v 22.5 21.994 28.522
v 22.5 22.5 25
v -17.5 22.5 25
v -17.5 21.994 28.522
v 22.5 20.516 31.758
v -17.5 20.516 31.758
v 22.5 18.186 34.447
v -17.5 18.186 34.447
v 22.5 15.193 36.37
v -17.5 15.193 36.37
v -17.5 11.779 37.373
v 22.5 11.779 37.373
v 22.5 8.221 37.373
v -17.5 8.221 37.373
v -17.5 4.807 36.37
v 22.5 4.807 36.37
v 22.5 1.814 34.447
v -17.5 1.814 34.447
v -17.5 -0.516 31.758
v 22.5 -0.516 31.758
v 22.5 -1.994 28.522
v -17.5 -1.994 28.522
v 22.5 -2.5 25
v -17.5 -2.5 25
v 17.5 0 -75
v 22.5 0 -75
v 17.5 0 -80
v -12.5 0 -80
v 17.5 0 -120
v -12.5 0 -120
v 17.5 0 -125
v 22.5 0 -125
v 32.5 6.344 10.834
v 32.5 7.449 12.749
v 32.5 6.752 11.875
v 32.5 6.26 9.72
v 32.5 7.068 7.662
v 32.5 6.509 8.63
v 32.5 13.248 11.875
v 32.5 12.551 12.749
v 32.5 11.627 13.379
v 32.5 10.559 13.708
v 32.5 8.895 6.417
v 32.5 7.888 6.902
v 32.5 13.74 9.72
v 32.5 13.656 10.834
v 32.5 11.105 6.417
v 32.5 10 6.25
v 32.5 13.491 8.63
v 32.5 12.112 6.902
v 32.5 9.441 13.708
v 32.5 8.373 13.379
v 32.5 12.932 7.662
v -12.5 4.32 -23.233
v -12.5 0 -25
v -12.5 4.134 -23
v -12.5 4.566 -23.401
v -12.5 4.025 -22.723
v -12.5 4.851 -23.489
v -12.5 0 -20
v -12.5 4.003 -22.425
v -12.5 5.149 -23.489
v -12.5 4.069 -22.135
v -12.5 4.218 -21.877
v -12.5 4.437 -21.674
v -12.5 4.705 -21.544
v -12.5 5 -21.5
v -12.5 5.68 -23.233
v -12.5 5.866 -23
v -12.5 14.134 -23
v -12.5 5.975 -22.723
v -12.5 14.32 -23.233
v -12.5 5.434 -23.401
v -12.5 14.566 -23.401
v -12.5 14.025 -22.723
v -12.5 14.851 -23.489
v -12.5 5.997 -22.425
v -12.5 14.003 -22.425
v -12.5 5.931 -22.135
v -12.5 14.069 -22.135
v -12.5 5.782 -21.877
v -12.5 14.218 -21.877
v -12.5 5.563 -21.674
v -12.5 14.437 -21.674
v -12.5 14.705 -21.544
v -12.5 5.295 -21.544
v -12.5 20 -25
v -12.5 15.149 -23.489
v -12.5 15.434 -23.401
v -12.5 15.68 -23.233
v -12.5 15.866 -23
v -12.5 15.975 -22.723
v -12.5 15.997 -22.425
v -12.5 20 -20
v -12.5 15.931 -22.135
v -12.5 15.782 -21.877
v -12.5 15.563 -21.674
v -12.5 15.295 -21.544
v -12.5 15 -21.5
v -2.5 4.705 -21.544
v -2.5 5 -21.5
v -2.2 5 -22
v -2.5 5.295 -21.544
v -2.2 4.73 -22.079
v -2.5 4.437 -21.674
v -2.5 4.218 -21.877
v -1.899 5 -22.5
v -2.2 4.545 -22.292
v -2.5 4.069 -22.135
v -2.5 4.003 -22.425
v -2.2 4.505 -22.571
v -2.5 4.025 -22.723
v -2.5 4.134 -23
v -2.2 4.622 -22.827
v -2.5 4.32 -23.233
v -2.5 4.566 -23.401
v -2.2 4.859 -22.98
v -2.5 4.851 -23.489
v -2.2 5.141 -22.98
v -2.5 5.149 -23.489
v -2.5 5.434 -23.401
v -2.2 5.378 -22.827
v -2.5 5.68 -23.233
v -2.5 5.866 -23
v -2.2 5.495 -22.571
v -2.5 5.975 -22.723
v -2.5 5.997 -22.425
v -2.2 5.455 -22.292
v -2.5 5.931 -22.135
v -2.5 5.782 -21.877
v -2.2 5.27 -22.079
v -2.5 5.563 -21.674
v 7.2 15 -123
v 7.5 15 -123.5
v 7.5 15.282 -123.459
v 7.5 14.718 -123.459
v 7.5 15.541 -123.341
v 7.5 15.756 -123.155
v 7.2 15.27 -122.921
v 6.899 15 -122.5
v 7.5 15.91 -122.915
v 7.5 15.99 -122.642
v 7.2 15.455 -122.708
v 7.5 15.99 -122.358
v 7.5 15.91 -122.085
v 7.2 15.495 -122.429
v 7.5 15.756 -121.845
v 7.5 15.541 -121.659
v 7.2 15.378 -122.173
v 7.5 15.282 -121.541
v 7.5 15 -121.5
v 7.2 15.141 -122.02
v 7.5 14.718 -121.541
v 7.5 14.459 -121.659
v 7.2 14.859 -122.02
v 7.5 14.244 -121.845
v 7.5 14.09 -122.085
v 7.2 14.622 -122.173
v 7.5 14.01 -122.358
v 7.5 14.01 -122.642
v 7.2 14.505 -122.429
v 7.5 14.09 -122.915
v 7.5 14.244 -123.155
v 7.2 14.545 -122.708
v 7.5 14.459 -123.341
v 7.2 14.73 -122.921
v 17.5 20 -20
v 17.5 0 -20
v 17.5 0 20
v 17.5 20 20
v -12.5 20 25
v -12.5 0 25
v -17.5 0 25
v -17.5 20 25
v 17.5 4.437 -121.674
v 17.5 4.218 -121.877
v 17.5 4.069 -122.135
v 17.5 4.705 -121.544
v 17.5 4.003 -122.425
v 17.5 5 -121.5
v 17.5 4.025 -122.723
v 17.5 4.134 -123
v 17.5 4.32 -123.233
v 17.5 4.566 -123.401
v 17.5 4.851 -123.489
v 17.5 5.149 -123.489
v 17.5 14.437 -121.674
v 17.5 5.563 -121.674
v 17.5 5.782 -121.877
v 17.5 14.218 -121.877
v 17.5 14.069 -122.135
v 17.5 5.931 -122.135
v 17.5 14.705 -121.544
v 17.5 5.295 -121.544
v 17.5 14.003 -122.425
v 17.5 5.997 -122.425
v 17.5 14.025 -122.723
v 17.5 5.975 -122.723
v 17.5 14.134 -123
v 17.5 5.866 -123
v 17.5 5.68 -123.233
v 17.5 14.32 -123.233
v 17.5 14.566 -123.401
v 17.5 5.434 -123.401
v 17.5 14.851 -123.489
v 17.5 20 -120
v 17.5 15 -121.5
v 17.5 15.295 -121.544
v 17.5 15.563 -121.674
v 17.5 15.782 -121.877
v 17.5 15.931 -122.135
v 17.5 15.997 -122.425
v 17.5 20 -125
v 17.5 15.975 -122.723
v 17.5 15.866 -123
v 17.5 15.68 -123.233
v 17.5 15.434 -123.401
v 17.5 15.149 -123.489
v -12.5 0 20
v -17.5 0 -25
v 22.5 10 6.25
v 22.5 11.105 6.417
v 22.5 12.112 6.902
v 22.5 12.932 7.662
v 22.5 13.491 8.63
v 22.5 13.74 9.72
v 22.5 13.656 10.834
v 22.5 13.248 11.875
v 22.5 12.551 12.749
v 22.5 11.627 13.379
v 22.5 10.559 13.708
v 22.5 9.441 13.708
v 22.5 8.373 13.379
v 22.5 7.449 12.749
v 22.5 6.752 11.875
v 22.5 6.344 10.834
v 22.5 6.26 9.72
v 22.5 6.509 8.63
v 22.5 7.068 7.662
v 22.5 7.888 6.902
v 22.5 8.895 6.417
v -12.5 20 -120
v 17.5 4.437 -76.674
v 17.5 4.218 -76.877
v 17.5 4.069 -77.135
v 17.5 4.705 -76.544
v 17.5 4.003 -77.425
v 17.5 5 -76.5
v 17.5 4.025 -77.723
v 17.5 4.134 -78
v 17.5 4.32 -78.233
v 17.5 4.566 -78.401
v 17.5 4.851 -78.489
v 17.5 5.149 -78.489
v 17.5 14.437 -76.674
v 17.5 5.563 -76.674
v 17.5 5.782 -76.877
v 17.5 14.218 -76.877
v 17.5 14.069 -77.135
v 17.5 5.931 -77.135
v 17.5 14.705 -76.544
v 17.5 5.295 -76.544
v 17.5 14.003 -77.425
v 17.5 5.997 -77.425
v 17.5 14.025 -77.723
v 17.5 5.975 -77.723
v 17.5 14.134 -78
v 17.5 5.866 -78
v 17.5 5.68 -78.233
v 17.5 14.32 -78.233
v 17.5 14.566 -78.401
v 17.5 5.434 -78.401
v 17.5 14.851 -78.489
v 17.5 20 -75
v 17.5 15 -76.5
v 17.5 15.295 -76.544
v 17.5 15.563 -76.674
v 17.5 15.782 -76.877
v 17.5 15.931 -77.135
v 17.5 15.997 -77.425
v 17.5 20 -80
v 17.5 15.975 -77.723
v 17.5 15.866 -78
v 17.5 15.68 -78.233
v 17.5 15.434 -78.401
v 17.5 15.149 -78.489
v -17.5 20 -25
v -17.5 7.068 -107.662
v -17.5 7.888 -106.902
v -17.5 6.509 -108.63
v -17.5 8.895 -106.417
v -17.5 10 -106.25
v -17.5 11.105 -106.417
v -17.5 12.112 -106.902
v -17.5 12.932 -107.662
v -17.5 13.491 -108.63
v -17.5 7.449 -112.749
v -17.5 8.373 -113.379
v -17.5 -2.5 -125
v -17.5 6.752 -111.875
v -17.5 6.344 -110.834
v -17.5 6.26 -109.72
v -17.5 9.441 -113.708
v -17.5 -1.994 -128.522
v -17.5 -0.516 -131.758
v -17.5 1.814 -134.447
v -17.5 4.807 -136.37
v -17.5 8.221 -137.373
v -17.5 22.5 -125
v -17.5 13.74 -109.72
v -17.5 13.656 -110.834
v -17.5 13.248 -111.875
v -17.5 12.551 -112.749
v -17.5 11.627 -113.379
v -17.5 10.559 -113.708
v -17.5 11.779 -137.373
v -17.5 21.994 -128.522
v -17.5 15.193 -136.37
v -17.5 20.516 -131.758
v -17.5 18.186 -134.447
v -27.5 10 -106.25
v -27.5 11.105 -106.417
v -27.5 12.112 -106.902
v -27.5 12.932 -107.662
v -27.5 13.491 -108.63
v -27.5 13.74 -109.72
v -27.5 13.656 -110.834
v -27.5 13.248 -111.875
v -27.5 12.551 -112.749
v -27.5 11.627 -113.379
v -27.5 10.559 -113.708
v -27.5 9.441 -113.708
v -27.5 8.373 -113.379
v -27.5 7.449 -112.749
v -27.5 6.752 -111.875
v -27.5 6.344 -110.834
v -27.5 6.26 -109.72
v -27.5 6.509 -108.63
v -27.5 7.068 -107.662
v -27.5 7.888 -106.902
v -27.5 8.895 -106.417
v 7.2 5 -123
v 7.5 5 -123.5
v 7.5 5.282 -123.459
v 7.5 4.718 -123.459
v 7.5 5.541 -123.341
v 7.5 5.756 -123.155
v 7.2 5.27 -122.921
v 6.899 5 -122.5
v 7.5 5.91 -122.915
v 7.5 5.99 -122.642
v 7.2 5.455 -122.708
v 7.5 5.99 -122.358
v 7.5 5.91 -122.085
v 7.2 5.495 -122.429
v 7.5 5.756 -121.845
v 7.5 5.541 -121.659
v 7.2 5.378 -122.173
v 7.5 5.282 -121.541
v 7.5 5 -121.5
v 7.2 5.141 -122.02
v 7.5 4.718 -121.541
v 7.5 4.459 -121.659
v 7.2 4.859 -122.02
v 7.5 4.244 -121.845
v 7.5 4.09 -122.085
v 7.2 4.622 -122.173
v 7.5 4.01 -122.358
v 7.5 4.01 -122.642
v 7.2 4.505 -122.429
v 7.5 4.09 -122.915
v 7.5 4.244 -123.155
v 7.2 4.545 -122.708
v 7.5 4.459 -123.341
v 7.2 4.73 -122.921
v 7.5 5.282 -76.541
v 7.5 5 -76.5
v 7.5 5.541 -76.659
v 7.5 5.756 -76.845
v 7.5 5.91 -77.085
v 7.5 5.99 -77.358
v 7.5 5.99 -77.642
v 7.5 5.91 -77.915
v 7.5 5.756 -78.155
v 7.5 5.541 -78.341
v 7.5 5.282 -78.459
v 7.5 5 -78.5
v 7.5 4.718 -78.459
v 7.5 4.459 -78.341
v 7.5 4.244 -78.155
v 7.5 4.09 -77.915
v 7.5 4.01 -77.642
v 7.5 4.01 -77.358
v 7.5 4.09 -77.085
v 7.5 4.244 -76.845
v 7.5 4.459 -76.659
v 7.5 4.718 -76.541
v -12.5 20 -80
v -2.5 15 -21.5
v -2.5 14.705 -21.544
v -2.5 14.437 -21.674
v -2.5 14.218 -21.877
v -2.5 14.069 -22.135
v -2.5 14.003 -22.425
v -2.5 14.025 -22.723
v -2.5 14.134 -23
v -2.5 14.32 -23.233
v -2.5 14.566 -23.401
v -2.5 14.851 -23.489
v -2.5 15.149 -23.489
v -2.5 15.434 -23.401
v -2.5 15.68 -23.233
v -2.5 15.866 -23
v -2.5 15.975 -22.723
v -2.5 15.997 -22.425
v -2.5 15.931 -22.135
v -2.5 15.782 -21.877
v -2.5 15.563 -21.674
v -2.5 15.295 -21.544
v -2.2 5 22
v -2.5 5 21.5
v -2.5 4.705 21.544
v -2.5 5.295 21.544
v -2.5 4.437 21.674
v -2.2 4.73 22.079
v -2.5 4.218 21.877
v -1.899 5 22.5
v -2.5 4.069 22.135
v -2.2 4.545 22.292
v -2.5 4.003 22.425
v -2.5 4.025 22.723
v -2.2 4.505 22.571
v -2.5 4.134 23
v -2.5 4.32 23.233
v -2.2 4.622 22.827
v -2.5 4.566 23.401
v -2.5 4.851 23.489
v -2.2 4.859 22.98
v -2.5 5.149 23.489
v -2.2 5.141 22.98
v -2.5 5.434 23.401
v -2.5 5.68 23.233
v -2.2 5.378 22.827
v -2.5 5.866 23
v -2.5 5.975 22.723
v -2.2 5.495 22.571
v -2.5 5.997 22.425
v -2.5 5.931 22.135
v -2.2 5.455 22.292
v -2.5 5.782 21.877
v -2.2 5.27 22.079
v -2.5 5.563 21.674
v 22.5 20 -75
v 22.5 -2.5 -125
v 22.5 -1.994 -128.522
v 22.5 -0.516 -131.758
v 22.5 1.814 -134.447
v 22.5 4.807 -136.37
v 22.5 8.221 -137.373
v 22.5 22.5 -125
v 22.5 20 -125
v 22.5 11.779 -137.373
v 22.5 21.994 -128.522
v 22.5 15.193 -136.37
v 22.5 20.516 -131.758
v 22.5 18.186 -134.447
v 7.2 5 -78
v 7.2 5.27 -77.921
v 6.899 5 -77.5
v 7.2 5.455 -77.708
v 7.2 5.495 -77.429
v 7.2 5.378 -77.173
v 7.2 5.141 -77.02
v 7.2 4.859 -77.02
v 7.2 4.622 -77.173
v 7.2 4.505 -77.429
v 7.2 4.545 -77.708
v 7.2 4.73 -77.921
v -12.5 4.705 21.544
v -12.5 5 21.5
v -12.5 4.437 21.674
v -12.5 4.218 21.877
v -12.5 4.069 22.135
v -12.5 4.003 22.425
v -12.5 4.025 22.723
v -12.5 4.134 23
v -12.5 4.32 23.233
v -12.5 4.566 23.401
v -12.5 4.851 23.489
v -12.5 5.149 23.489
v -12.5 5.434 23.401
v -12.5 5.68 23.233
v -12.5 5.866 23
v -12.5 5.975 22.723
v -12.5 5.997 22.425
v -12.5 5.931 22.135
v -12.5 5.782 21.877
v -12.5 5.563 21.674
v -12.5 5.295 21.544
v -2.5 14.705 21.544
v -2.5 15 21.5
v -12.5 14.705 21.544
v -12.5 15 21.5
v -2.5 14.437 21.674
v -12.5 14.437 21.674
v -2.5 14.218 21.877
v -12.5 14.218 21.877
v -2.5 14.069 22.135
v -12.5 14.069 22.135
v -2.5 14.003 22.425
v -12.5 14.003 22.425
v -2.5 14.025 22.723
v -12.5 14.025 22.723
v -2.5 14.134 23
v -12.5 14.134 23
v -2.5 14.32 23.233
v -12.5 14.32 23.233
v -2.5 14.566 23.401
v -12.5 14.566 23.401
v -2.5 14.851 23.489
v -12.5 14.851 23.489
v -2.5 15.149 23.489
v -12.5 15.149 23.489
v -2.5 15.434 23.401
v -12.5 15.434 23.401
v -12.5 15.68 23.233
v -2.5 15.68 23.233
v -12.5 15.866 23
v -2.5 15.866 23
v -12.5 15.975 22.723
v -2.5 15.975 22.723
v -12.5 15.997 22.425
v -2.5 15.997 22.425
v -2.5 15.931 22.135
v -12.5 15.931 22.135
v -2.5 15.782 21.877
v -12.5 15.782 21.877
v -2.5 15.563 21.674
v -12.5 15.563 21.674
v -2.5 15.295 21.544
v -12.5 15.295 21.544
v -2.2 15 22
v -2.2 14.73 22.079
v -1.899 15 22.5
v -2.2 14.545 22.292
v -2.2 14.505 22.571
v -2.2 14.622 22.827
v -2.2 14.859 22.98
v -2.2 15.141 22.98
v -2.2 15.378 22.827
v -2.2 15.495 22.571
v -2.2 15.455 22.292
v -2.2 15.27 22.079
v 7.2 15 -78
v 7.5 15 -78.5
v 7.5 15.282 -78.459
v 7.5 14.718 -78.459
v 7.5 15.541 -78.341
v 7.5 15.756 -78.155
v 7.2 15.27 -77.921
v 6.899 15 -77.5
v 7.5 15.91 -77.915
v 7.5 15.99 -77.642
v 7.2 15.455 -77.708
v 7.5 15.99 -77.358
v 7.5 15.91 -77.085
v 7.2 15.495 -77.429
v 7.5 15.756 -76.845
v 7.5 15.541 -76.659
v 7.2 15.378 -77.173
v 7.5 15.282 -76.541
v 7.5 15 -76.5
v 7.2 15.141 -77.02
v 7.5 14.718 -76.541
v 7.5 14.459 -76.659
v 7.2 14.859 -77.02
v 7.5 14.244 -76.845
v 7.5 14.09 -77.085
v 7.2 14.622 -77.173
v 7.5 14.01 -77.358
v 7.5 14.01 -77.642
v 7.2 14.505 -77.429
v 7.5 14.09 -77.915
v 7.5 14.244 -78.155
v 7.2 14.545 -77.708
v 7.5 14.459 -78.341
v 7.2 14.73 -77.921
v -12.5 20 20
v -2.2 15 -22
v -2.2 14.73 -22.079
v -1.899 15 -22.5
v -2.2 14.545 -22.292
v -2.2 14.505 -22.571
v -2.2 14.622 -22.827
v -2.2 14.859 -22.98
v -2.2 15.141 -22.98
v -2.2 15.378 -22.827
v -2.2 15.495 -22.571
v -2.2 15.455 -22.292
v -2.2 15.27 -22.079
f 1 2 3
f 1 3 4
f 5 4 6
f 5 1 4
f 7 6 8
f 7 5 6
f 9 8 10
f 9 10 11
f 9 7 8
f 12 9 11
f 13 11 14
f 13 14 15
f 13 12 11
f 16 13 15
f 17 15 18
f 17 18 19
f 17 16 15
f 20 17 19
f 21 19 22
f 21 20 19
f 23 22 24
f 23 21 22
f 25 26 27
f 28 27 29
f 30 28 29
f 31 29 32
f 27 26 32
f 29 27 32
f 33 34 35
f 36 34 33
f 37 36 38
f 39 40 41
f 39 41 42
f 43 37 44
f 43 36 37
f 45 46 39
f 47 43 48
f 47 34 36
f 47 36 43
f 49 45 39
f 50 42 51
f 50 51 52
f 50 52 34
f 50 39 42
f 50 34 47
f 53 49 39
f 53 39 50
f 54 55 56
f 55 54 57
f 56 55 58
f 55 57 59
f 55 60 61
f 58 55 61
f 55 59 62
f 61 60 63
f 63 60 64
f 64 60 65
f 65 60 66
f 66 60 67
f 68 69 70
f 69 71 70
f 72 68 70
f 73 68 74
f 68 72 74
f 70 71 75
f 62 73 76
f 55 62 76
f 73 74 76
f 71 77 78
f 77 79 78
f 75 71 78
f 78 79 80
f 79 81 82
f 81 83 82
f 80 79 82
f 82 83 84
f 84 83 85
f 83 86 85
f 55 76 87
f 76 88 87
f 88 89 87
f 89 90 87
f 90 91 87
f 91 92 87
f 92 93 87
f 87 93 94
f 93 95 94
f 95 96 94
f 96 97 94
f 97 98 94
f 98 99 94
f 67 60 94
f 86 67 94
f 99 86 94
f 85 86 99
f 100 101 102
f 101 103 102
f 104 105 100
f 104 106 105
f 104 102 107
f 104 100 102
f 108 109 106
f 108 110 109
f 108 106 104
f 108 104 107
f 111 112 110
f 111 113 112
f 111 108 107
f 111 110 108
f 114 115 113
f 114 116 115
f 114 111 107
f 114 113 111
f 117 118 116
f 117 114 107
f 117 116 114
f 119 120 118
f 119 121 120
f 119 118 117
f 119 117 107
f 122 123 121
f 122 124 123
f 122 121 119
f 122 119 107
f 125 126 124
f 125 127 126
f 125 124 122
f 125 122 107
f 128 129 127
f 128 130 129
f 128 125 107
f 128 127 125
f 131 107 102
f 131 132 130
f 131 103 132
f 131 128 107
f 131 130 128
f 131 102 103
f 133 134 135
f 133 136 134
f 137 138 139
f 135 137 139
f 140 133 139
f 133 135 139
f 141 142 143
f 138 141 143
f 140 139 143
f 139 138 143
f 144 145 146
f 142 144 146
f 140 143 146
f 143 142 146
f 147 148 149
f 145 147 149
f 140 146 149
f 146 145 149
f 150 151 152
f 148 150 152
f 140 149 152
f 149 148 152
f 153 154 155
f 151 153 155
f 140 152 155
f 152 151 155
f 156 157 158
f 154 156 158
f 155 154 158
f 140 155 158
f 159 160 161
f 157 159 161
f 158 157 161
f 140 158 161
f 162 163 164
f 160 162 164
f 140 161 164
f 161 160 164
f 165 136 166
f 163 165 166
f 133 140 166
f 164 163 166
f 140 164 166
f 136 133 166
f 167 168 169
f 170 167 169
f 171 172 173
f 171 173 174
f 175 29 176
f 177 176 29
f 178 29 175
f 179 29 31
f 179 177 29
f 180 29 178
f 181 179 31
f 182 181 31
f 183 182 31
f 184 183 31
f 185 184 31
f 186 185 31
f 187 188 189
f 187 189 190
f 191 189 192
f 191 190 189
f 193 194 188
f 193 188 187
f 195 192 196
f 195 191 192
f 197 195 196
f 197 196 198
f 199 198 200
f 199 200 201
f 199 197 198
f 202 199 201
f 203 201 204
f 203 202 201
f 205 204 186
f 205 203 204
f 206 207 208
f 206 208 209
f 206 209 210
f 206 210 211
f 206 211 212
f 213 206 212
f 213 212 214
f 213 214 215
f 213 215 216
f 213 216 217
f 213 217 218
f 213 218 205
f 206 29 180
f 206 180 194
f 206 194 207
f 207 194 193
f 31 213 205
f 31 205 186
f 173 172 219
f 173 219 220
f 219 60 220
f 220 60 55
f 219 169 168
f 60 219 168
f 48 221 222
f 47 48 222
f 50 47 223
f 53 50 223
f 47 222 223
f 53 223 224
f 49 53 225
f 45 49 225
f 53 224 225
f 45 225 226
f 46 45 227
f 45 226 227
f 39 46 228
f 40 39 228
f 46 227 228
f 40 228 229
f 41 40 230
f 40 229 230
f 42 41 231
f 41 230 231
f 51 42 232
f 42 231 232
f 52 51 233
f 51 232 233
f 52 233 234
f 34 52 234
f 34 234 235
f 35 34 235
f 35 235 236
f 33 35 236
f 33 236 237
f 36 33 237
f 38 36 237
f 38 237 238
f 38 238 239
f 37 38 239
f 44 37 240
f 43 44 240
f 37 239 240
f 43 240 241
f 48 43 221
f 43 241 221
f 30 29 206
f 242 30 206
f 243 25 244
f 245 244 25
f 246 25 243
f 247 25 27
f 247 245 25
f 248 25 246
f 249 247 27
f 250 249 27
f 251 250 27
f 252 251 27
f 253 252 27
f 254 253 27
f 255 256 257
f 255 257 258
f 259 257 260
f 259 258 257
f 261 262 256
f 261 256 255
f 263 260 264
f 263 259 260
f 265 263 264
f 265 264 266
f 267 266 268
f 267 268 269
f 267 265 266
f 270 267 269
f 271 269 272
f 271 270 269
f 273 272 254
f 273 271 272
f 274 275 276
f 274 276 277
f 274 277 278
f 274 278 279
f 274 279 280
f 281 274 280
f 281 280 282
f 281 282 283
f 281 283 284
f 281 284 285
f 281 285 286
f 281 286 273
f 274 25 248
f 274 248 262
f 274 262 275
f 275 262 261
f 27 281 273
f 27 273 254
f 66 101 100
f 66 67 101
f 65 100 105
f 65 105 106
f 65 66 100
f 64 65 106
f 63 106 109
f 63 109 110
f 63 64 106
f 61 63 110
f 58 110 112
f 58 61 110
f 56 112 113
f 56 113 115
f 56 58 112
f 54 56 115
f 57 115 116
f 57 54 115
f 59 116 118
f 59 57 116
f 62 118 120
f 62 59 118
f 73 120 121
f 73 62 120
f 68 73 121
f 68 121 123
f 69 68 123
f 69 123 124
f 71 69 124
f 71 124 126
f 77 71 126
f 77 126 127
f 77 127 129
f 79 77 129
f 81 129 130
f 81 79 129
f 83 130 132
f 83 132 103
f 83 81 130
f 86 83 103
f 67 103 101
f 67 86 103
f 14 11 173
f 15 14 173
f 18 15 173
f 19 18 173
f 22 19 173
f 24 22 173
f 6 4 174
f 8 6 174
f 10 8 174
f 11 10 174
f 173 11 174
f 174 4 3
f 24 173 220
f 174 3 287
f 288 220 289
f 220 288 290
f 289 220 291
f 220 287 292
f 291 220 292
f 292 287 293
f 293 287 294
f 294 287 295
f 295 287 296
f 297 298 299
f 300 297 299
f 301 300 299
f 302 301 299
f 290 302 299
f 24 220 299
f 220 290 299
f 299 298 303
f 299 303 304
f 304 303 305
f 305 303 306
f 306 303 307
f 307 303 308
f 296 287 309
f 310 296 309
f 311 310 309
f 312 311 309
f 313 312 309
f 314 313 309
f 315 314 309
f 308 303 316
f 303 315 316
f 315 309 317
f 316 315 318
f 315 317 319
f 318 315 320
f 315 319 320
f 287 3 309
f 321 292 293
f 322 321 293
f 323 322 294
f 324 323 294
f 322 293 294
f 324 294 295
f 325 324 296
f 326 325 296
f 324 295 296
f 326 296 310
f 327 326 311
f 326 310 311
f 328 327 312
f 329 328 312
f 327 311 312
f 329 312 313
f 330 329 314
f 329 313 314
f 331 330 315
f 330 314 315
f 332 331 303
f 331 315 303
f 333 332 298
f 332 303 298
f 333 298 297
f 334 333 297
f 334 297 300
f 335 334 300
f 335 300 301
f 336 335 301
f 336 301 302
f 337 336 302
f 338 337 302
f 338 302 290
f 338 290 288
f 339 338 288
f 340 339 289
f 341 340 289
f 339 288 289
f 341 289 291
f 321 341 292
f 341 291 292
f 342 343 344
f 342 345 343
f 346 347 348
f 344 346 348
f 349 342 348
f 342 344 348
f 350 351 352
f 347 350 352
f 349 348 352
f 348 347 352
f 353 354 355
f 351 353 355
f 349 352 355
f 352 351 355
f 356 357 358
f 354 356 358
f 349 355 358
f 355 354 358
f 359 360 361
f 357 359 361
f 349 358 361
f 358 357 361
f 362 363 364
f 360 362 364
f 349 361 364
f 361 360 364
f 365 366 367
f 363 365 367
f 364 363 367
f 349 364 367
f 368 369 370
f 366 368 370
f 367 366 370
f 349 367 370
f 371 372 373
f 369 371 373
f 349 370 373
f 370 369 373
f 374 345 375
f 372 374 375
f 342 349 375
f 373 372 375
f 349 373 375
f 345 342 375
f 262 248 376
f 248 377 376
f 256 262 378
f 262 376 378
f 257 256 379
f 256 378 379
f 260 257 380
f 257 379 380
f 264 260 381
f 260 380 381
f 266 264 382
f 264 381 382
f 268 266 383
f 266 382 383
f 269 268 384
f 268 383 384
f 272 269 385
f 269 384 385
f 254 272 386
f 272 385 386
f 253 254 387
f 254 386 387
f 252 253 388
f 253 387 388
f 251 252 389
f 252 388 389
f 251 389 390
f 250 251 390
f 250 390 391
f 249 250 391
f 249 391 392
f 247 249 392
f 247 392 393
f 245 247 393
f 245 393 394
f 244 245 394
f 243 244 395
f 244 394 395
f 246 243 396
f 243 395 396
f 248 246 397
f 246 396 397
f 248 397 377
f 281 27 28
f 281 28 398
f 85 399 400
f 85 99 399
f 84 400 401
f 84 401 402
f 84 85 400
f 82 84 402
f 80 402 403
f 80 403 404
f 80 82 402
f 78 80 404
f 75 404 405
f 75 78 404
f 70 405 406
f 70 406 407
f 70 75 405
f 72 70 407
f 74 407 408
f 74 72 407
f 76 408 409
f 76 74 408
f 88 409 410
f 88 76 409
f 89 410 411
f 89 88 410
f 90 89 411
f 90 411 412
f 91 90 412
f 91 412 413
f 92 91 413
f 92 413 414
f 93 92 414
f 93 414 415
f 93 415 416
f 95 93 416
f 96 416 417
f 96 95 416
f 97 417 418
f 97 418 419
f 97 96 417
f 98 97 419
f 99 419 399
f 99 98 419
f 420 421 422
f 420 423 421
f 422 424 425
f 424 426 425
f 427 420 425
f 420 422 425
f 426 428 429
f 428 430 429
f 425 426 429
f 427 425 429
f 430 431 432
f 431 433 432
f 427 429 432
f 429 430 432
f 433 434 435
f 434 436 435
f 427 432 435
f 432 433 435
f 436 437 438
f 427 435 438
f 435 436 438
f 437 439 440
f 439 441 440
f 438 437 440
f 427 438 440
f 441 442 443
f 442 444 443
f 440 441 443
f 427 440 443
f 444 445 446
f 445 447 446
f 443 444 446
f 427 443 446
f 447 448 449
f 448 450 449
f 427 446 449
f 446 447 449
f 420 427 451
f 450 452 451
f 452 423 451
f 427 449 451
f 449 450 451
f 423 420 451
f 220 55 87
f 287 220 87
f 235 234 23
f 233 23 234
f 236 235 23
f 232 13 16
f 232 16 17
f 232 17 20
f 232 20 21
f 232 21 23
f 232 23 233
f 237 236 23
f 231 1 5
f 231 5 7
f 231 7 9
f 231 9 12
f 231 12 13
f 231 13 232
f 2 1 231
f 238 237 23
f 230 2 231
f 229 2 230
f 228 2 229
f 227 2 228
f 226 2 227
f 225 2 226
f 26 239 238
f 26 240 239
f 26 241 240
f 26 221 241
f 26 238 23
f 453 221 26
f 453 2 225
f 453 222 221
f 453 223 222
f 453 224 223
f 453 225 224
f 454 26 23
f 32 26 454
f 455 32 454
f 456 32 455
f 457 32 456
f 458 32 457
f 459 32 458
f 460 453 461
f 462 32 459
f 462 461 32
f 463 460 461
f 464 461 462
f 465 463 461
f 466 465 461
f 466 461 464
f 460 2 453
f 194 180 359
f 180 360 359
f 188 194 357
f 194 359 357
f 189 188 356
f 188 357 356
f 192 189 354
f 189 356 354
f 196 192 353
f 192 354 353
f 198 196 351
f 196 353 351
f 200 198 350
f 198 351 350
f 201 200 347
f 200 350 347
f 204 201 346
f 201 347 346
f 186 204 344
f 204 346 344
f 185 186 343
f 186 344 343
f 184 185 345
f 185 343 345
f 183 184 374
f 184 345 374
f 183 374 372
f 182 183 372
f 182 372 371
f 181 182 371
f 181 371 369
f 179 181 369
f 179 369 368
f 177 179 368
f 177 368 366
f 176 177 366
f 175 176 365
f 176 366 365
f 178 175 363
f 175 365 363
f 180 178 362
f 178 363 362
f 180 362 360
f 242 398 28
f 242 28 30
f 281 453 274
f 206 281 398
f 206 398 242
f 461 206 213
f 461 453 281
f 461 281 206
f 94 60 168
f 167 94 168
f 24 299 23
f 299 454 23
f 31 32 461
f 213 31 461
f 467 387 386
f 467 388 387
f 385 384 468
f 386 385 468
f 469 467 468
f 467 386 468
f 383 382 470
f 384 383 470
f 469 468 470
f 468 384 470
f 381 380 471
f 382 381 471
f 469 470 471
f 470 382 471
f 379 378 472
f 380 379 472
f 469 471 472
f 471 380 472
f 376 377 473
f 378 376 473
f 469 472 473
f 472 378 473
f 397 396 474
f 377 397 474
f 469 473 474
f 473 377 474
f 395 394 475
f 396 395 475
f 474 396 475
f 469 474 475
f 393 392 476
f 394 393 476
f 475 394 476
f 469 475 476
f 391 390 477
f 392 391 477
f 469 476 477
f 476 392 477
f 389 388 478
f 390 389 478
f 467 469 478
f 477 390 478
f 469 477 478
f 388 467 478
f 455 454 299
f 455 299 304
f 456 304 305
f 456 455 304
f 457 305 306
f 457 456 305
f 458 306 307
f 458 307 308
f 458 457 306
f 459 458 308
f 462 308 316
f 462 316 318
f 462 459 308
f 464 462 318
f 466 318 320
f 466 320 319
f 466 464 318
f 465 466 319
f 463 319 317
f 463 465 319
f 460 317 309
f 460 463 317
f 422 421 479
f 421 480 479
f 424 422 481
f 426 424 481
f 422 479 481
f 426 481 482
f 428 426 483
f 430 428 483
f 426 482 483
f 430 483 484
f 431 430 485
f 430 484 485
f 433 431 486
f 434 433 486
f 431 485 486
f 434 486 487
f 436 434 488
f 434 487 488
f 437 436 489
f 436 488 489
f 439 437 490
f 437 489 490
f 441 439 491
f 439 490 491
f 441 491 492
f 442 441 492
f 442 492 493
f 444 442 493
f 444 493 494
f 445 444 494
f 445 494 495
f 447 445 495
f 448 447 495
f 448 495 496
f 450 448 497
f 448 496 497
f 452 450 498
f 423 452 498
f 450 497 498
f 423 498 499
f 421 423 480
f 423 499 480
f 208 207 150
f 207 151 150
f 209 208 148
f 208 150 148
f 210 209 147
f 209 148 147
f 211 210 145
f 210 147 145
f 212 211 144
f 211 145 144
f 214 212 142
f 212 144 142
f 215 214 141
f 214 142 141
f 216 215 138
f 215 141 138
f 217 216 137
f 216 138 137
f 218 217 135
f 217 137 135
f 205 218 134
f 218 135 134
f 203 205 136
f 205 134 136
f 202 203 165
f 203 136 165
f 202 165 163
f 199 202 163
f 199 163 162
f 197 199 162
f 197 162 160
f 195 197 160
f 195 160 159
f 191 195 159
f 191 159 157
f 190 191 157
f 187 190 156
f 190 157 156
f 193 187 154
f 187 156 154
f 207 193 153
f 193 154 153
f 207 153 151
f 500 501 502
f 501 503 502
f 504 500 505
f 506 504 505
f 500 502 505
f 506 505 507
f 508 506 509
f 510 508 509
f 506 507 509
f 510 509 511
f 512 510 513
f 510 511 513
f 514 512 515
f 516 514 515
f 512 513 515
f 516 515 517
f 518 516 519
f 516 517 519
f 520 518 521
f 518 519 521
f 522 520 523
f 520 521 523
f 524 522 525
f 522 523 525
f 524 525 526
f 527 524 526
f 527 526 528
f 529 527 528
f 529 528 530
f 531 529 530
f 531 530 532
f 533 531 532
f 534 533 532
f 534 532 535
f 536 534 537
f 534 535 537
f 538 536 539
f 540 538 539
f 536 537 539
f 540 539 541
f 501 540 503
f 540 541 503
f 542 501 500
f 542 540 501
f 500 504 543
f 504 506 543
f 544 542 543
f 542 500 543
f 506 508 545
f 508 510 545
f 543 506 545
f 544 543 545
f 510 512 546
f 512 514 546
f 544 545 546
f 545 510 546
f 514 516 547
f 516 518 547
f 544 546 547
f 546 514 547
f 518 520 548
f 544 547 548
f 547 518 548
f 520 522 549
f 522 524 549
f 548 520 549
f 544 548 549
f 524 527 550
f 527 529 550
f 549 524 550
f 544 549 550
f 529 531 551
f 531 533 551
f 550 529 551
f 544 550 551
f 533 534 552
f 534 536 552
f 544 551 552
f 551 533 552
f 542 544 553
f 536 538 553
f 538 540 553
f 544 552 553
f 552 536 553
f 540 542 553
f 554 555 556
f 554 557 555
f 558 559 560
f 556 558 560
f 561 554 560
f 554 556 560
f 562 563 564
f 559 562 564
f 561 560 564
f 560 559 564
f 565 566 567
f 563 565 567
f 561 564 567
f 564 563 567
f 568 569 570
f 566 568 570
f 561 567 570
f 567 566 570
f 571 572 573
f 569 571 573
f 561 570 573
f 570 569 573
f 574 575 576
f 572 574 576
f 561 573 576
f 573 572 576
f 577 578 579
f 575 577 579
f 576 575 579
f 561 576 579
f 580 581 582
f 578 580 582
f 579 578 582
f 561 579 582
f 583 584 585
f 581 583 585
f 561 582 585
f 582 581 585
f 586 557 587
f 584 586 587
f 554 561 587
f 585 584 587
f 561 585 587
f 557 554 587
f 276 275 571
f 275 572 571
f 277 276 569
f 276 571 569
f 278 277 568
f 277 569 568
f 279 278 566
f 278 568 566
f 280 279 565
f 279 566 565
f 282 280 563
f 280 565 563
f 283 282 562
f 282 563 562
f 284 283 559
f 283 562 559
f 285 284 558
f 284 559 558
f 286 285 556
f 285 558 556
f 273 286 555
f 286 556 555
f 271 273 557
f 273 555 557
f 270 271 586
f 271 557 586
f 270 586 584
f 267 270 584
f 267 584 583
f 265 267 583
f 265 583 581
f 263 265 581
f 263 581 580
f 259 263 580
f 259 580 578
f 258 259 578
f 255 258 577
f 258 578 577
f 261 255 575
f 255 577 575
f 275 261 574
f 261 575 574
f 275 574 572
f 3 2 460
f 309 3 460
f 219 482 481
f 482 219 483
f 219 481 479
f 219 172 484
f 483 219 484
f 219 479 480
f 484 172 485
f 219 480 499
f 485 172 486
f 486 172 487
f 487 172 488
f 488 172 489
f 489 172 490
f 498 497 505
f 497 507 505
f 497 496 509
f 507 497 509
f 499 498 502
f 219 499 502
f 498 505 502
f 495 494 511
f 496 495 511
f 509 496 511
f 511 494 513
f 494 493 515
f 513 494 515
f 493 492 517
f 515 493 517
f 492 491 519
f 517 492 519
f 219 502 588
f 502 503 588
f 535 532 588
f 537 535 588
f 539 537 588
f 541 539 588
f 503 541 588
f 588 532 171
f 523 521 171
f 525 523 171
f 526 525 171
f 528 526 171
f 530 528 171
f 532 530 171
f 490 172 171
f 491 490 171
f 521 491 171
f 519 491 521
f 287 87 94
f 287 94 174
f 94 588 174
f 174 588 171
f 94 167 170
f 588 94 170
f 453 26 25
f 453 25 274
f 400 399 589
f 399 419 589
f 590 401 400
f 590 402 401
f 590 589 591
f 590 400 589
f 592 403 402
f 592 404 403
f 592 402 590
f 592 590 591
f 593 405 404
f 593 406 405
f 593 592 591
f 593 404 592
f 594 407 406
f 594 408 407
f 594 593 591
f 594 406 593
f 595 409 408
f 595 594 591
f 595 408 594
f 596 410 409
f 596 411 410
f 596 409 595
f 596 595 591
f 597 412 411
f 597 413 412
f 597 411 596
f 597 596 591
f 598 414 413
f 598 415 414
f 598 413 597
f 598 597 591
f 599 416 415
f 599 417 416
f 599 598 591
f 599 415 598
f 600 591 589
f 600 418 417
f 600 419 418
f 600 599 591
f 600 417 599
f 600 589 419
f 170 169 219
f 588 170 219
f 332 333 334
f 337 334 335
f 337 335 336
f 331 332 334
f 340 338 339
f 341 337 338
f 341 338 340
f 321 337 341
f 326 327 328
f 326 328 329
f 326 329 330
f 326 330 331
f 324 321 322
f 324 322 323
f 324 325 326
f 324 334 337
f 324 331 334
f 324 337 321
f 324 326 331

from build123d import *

# Parameters (mm, degrees)
BOSS_EXTRUDE1_DEPTH            = 20
F_2_0MM_DOWEL_HOLE1_AT_2_COUNT = 2
F_2_0MM_DOWEL_HOLE1_AT_2_PITCH = 10
SKETCH8_R                      = 3.75
BOSS_EXTRUDE2_DEPTH            = 10
SKETCH9_W                      = 35
SKETCH9_H                      = 50
BOSS_EXTRUDE3_DEPTH            = 2.5
SKETCH10_W                     = 35
SKETCH10_H                     = 50
BOSS_EXTRUDE4_DEPTH            = 2.5
SKETCH11_W                     = 35
SKETCH11_H                     = 25
BOSS_EXTRUDE5_DEPTH            = 100
BOSS_EXTRUDE6_DEPTH            = 5
BOSS_EXTRUDE9_DEPTH            = 40
BOSS_EXTRUDE10_DEPTH           = 40
SKETCH24_W                     = 50
SKETCH24_H                     = 20
CUT_EXTRUDE4_DEPTH             = 5
SKETCH26_W                     = 40
SKETCH26_H                     = 20
CUT_EXTRUDE5_DEPTH             = 35
F_2_0MM_DOWEL_HOLE2_D          = 2
F_2_0MM_DOWEL_HOLE2_DEPTH      = 10
F_2_0MM_DOWEL_HOLE2_TIP        = 0.600860619
SKETCH30_R                     = 3.75
BOSS_EXTRUDE11_DEPTH           = 10


with BuildPart() as part:
    # Sketch1 → Boss-Extrude1 (new body)
    with BuildSketch(Plane(origin=(0, 0, 0), x_dir=(1, 0, 0), z_dir=(0, 1, 0))):
        Polygon((-12.5, 25), (-12.5, 20), (17.5, 20), (17.5, -20), (-12.5, -20), (-12.5, -25), (22.5, -25), (22.5, 25), align=None)
    extrude(amount=BOSS_EXTRUDE1_DEPTH)

    # Sketch7 → Ø2.0mm Dowel Hole1 (revolve, cut)
    with BuildSketch(Plane(origin=(-12.5, 15, -22.5), x_dir=(0, 0, 1), z_dir=(0, 1, 0))):
        Polygon((0, 0), (0, 10.600860619), (1, 10), (1, 0), align=None)
    f_2_0mm_dowel_hole1 = revolve(axis=Axis((-18.85, 15, -22.5), (1, 0, 0)), mode=Mode.SUBTRACT)

    # Ø2.0mm Dowel Hole1 at 2: Ø2.0mm Dowel Hole1 ×2
    with Locations(*[(0, -i * F_2_0MM_DOWEL_HOLE1_AT_2_PITCH, 0) for i in range(1, F_2_0MM_DOWEL_HOLE1_AT_2_COUNT)]):
        add(f_2_0mm_dowel_hole1, mode=Mode.SUBTRACT)

    # Mirror1: Ø2.0mm Dowel Hole1 across plane
    add(f_2_0mm_dowel_hole1.mirror(Plane.XY), mode=Mode.SUBTRACT)

    # Mirror1 copy 1 sketch → Mirror1 copy 1 (revolve, cut)
    with BuildSketch(Plane(origin=(-12.5, 5, 22.5), x_dir=(0, 0, -1), z_dir=(0, 1, 0))):
        Polygon((0, 0), (0, -10.600860619), (1, -10), (1, 0), align=None)
    revolve(axis=Axis((-18.85, 5, 22.5), (-1, 0, 0)), mode=Mode.SUBTRACT)

    # Sketch8 → Boss-Extrude2 (add)
    with BuildSketch(Plane(origin=(22.5, 0, 0), x_dir=(0, 0, -1), z_dir=(1, 0, 0))):
        with Locations((-10, 10)):
            Circle(SKETCH8_R)
    extrude(amount=BOSS_EXTRUDE2_DEPTH)

    # Sketch9 → Boss-Extrude3 (add)
    with BuildSketch(Plane(origin=(0, 20, 0), x_dir=(1, 0, 0), z_dir=(0, 1, 0))):
        with Locations((5, 0)):
            Rectangle(SKETCH9_W, SKETCH9_H)
    extrude(amount=BOSS_EXTRUDE3_DEPTH)

    # Sketch10 → Boss-Extrude4 (add)
    with BuildSketch(Plane.XZ):
        with Locations((5, 0)):
            Rectangle(SKETCH10_W, SKETCH10_H)
    extrude(amount=BOSS_EXTRUDE4_DEPTH)

    # Sketch11 → Boss-Extrude5 (add)
    with BuildSketch(Plane(origin=(0, 0, -25), x_dir=(-1, 0, 0), z_dir=(0, 0, -1))):
        with Locations((-5, 10)):
            Rectangle(SKETCH11_W, SKETCH11_H)
    extrude(amount=BOSS_EXTRUDE5_DEPTH)

    # Sketch12 → Boss-Extrude6 (add)
    with BuildSketch(Plane.ZY.offset(12.5)):
        Polygon((25, 22.5), (-125, 22.5), (-125, -2.5), (25, -2.5), (25, 0), (20, 0), (-20, 0), (-25, 0), (-25, 20), (-20, 20), (20, 20), (25, 20), align=None)
    extrude(amount=BOSS_EXTRUDE6_DEPTH)

    # Sketch20 → Boss-Extrude9 (add)
    with BuildSketch(Plane(origin=(22.5, 0, 0), x_dir=(0, 0, -1), z_dir=(1, 0, 0))):
        with BuildLine():
            ThreePointArc((125, -2.5), (137.5, 10), (125, 22.5))
            Line((125, 22.5), (125, -2.5))
        make_face()
    extrude(amount=-BOSS_EXTRUDE9_DEPTH)

    # Sketch23 → Boss-Extrude10 (add)
    with BuildSketch(Plane(origin=(22.5, 0, 0), x_dir=(0, 0, -1), z_dir=(1, 0, 0))):
        with BuildLine():
            Line((-25, -2.5), (-25, 22.5))
            ThreePointArc((-25, 22.5), (-37.5, 10), (-25, -2.5))
        make_face()
    extrude(amount=-BOSS_EXTRUDE10_DEPTH)

    # Sketch24 → Cut-Extrude4 (cut)
    with BuildSketch(Plane(origin=(22.5, 0, 0), x_dir=(0, 0, -1), z_dir=(1, 0, 0))):
        with Locations((100, 10)):
            Rectangle(SKETCH24_W, SKETCH24_H)
    extrude(amount=-CUT_EXTRUDE4_DEPTH, mode=Mode.SUBTRACT)

    # Sketch26 → Cut-Extrude5 (cut)
    with BuildSketch(Plane(origin=(22.5, 0, 0), x_dir=(0, 0, -1), z_dir=(1, 0, 0))):
        with Locations((100, 10)):
            Rectangle(SKETCH26_W, SKETCH26_H)
    extrude(amount=-CUT_EXTRUDE5_DEPTH, mode=Mode.SUBTRACT)

    # Ø2.0mm Dowel Hole2
    with Locations(Plane(origin=(17.5, 0, 0), x_dir=(0, 0, -1), z_dir=(1, 0, 0))):
        with Locations((77.5, 15), (77.5, 5), (122.5, 15), (122.5, 5)):
            Hole(F_2_0MM_DOWEL_HOLE2_D / 2, depth=F_2_0MM_DOWEL_HOLE2_DEPTH)
            with Locations((0, 0, -(F_2_0MM_DOWEL_HOLE2_DEPTH + F_2_0MM_DOWEL_HOLE2_TIP / 2))):  # 118° drill point
                Cone(0, F_2_0MM_DOWEL_HOLE2_D / 2, F_2_0MM_DOWEL_HOLE2_TIP, mode=Mode.SUBTRACT)

    # Sketch30 → Boss-Extrude11 (add)
    with BuildSketch(Plane.ZY.offset(17.5)):
        with Locations((-110, 10)):
            Circle(SKETCH30_R)
    extrude(amount=BOSS_EXTRUDE11_DEPTH)


solid = part.part
